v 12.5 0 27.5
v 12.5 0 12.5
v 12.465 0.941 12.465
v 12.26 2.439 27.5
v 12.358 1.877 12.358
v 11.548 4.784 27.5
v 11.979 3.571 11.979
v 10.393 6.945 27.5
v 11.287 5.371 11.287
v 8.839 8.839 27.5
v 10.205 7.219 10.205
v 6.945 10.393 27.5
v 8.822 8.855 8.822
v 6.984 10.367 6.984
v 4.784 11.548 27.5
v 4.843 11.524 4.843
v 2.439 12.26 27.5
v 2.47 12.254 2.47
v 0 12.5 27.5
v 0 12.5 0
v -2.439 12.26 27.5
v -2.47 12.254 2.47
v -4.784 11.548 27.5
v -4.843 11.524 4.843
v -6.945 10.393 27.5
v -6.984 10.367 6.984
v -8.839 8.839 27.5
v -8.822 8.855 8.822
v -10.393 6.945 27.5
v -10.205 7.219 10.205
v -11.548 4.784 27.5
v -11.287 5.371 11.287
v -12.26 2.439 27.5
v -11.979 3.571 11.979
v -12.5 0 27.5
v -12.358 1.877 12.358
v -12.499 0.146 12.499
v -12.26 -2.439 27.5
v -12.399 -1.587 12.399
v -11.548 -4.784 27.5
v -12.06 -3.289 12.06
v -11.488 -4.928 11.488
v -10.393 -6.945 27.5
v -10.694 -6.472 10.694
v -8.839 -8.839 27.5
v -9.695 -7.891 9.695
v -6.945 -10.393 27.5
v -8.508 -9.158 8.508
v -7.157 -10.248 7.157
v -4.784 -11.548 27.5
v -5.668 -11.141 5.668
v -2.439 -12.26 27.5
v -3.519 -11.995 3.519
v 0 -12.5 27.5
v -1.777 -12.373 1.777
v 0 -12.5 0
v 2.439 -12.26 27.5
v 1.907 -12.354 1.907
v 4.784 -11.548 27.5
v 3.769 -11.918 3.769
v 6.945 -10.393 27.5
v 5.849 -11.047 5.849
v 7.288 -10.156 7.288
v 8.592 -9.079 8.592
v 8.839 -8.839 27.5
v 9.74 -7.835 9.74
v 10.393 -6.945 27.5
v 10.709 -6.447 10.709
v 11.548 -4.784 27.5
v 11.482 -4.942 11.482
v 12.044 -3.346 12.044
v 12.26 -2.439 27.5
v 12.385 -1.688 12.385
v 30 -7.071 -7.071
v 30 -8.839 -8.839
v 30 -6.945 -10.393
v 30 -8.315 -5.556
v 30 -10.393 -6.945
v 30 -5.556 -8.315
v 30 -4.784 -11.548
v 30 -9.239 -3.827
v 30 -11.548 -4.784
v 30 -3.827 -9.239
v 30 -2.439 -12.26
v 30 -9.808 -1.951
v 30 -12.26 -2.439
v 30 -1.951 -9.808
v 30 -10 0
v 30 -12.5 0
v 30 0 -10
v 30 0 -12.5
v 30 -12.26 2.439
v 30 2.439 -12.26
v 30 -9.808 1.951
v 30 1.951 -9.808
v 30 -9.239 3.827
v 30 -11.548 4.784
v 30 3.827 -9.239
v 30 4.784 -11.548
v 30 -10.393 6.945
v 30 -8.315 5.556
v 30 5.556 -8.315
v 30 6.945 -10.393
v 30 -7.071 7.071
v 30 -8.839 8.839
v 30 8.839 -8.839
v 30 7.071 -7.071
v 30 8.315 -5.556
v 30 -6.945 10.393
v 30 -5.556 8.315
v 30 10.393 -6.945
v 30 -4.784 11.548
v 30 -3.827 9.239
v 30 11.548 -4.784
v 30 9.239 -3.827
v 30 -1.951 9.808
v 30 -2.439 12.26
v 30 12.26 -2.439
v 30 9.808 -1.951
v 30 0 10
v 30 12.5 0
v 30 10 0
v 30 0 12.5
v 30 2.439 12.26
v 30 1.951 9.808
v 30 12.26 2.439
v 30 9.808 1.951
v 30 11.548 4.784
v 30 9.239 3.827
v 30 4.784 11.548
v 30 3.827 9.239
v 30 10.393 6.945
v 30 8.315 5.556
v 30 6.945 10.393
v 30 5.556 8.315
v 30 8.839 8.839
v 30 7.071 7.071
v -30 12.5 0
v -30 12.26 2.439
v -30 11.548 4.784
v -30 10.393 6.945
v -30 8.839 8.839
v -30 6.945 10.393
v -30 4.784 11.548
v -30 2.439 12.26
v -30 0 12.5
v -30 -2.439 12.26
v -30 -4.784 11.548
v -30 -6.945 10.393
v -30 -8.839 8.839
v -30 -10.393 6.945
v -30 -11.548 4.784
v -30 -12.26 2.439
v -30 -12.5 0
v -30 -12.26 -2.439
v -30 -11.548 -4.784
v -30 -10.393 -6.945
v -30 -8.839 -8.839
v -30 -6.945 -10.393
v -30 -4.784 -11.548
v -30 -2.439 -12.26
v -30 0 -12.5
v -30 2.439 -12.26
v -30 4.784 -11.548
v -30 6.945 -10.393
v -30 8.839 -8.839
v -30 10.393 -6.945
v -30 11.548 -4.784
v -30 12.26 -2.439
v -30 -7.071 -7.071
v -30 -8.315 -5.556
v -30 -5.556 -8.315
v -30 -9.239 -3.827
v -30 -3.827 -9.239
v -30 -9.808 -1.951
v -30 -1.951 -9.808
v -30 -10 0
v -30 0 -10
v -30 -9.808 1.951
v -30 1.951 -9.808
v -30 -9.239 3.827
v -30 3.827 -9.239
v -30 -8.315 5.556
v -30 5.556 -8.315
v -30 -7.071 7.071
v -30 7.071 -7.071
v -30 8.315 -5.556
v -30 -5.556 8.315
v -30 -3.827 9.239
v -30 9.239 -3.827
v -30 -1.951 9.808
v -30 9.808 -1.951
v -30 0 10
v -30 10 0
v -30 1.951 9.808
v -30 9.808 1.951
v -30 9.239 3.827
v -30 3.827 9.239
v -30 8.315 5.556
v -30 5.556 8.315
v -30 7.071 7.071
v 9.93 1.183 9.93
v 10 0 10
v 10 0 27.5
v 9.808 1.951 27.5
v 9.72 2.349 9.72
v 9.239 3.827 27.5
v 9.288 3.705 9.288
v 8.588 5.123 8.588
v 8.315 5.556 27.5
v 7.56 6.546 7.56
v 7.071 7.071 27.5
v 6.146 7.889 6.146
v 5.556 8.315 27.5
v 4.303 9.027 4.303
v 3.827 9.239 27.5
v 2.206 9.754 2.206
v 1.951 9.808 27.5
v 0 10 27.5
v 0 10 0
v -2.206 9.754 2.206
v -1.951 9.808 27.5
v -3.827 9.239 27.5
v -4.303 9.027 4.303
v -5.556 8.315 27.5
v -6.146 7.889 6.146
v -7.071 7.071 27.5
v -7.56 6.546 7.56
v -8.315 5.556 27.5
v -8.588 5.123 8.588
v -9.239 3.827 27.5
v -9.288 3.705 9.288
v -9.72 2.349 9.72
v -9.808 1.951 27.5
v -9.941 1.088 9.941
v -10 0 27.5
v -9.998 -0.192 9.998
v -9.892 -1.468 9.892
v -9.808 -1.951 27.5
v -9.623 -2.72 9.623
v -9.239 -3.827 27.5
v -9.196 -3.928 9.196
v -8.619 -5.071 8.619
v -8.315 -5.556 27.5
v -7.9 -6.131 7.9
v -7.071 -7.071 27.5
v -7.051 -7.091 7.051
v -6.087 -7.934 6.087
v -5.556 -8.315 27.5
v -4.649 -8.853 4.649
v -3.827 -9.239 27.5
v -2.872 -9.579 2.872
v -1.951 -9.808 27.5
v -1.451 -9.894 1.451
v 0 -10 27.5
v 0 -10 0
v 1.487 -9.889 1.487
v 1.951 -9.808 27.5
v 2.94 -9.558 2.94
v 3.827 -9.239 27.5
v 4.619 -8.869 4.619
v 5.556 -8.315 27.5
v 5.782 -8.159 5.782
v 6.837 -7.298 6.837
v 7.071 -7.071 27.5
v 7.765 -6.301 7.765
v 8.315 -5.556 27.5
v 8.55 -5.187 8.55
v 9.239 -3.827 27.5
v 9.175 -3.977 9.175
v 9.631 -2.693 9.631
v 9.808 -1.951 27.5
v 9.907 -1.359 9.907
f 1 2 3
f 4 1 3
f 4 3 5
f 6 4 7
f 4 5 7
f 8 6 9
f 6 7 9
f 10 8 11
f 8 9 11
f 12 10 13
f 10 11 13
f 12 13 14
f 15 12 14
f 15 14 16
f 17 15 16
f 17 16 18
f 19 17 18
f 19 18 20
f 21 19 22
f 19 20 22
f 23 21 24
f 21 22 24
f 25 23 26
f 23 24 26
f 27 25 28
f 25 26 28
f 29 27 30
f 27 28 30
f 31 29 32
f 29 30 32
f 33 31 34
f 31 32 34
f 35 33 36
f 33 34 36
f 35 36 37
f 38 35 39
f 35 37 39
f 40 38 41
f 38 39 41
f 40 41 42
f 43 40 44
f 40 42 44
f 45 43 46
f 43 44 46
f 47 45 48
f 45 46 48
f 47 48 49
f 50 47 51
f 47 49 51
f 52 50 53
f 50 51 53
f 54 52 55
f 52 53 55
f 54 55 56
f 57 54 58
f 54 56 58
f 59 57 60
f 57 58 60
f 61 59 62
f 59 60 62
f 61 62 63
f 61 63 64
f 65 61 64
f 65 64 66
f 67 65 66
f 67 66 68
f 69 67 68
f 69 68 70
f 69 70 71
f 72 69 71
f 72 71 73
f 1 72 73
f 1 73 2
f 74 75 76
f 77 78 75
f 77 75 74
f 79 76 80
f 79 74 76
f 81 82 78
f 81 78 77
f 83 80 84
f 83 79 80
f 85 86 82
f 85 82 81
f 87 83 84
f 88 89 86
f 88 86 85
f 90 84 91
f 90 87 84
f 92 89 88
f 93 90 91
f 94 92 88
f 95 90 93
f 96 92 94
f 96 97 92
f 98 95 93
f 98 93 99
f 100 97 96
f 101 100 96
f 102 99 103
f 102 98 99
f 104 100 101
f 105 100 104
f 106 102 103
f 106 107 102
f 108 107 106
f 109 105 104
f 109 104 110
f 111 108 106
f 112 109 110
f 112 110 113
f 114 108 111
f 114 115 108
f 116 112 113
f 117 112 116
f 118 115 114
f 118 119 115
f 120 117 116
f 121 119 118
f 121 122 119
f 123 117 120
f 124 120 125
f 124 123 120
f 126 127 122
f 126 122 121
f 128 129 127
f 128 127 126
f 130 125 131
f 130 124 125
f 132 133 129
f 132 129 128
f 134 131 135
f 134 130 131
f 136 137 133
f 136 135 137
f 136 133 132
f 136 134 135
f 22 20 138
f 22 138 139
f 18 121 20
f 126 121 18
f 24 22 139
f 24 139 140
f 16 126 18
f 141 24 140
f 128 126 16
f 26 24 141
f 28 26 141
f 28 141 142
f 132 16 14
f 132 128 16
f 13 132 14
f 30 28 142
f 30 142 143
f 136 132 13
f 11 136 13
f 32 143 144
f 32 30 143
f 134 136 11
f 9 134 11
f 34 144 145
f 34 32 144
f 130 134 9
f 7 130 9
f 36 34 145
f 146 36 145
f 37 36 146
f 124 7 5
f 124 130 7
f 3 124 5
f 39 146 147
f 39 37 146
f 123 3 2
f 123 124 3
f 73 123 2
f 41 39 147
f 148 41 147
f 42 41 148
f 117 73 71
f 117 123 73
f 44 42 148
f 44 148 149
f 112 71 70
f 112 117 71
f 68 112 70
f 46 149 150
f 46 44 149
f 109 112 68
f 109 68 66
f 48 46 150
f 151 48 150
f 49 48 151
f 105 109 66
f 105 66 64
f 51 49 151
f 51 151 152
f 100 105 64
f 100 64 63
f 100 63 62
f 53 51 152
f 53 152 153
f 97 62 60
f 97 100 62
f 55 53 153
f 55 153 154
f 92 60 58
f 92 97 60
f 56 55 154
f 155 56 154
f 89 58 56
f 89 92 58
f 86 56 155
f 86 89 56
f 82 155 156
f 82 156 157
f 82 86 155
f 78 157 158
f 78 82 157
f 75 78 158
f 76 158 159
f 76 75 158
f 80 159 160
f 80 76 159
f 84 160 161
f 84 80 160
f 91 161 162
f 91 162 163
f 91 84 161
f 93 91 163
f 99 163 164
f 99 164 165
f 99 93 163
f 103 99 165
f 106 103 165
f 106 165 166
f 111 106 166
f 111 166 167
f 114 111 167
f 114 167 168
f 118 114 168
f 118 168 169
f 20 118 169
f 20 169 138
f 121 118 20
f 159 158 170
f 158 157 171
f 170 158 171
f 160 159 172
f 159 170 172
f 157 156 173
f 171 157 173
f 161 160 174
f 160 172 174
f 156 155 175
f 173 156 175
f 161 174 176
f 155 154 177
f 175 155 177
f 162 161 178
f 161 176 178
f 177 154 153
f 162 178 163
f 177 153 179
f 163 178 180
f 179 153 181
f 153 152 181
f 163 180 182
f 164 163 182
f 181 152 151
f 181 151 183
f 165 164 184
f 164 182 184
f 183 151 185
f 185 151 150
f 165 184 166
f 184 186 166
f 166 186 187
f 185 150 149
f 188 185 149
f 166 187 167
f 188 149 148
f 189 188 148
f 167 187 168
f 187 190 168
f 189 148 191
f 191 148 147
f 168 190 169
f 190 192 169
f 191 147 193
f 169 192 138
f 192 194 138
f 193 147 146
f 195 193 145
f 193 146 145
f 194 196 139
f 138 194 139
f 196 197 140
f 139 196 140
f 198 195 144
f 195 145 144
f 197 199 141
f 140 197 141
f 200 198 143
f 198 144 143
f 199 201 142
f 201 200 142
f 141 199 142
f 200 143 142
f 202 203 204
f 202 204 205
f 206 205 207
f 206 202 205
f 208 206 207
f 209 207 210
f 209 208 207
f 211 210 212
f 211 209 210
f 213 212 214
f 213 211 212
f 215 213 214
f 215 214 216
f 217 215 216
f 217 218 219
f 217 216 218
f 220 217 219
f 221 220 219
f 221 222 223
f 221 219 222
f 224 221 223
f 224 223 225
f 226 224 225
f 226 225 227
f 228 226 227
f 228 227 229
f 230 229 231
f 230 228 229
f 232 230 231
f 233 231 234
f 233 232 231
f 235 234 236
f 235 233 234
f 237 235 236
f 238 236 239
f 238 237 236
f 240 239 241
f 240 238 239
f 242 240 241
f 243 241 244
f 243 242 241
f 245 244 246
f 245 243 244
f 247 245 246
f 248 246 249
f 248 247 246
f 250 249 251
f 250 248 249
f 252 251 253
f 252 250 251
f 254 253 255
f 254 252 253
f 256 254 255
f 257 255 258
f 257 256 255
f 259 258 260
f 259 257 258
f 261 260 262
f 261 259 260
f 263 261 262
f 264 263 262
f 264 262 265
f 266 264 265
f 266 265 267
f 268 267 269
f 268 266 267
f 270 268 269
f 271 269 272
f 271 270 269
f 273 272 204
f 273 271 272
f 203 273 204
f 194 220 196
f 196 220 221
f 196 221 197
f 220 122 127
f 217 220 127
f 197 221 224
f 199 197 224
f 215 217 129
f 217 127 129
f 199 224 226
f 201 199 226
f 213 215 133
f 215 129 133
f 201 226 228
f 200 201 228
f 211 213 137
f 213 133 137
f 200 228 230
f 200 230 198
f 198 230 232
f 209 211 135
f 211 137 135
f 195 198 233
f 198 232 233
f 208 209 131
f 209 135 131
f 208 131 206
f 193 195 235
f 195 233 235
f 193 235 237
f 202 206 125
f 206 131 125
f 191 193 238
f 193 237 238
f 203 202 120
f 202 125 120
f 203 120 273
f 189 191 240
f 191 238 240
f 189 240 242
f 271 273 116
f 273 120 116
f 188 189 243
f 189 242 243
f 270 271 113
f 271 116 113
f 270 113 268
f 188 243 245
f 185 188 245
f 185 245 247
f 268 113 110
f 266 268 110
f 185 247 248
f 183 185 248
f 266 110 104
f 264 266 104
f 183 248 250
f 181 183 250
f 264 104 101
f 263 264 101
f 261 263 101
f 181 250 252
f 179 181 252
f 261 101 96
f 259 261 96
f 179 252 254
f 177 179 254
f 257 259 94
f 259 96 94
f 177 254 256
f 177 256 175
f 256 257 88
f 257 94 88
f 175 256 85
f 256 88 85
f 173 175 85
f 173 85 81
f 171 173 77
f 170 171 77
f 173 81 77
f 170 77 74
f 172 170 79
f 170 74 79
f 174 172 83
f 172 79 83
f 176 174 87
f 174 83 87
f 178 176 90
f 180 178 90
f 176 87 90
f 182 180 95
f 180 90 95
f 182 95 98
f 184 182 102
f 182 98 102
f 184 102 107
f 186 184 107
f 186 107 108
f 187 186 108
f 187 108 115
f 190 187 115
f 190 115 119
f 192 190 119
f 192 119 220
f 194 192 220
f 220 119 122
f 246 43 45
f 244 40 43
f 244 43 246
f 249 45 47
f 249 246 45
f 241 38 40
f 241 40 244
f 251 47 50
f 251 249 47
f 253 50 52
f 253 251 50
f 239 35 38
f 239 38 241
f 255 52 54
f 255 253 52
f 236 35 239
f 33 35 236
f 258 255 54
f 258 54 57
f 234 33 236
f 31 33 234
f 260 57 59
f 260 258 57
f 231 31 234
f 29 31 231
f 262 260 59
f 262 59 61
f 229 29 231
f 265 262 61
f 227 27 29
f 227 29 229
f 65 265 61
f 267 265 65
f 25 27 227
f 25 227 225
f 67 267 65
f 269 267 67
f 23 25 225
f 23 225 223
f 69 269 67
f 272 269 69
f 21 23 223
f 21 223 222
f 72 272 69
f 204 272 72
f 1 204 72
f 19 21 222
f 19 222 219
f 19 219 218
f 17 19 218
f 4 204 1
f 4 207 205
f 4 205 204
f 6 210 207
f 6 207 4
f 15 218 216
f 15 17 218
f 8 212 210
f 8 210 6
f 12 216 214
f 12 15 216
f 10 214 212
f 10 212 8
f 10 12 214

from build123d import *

# Parameters (mm, degrees)
F0_R     = 12.5
F1_DEPTH = 30
F2_R     = 12.5
F3_DEPTH = 27.5
F4_R     = 10
F5_DEPTH = 30
F6_R     = 10
F7_DEPTH = 45


with BuildPart() as f1:
    # F0 (on Right) → F1 (new body, symmetric)
    with BuildSketch(Plane.YZ):
        Circle(F0_R)
    extrude(amount=F1_DEPTH, both=True)

    # F2 (on Top) → F3 (join)
    with BuildSketch(Plane.XY):
        Circle(F2_R)
    extrude(amount=F3_DEPTH)

    # F4 (on Right) → F5 (cut, symmetric)
    with BuildSketch(Plane.YZ):
        Circle(F4_R)
    extrude(amount=F5_DEPTH, both=True, mode=Mode.SUBTRACT)

    # F6 (on Top) → F7 (cut)
    with BuildSketch(Plane.XY):
        Circle(F6_R)
    extrude(amount=F7_DEPTH, mode=Mode.SUBTRACT)


solid = f1.part
